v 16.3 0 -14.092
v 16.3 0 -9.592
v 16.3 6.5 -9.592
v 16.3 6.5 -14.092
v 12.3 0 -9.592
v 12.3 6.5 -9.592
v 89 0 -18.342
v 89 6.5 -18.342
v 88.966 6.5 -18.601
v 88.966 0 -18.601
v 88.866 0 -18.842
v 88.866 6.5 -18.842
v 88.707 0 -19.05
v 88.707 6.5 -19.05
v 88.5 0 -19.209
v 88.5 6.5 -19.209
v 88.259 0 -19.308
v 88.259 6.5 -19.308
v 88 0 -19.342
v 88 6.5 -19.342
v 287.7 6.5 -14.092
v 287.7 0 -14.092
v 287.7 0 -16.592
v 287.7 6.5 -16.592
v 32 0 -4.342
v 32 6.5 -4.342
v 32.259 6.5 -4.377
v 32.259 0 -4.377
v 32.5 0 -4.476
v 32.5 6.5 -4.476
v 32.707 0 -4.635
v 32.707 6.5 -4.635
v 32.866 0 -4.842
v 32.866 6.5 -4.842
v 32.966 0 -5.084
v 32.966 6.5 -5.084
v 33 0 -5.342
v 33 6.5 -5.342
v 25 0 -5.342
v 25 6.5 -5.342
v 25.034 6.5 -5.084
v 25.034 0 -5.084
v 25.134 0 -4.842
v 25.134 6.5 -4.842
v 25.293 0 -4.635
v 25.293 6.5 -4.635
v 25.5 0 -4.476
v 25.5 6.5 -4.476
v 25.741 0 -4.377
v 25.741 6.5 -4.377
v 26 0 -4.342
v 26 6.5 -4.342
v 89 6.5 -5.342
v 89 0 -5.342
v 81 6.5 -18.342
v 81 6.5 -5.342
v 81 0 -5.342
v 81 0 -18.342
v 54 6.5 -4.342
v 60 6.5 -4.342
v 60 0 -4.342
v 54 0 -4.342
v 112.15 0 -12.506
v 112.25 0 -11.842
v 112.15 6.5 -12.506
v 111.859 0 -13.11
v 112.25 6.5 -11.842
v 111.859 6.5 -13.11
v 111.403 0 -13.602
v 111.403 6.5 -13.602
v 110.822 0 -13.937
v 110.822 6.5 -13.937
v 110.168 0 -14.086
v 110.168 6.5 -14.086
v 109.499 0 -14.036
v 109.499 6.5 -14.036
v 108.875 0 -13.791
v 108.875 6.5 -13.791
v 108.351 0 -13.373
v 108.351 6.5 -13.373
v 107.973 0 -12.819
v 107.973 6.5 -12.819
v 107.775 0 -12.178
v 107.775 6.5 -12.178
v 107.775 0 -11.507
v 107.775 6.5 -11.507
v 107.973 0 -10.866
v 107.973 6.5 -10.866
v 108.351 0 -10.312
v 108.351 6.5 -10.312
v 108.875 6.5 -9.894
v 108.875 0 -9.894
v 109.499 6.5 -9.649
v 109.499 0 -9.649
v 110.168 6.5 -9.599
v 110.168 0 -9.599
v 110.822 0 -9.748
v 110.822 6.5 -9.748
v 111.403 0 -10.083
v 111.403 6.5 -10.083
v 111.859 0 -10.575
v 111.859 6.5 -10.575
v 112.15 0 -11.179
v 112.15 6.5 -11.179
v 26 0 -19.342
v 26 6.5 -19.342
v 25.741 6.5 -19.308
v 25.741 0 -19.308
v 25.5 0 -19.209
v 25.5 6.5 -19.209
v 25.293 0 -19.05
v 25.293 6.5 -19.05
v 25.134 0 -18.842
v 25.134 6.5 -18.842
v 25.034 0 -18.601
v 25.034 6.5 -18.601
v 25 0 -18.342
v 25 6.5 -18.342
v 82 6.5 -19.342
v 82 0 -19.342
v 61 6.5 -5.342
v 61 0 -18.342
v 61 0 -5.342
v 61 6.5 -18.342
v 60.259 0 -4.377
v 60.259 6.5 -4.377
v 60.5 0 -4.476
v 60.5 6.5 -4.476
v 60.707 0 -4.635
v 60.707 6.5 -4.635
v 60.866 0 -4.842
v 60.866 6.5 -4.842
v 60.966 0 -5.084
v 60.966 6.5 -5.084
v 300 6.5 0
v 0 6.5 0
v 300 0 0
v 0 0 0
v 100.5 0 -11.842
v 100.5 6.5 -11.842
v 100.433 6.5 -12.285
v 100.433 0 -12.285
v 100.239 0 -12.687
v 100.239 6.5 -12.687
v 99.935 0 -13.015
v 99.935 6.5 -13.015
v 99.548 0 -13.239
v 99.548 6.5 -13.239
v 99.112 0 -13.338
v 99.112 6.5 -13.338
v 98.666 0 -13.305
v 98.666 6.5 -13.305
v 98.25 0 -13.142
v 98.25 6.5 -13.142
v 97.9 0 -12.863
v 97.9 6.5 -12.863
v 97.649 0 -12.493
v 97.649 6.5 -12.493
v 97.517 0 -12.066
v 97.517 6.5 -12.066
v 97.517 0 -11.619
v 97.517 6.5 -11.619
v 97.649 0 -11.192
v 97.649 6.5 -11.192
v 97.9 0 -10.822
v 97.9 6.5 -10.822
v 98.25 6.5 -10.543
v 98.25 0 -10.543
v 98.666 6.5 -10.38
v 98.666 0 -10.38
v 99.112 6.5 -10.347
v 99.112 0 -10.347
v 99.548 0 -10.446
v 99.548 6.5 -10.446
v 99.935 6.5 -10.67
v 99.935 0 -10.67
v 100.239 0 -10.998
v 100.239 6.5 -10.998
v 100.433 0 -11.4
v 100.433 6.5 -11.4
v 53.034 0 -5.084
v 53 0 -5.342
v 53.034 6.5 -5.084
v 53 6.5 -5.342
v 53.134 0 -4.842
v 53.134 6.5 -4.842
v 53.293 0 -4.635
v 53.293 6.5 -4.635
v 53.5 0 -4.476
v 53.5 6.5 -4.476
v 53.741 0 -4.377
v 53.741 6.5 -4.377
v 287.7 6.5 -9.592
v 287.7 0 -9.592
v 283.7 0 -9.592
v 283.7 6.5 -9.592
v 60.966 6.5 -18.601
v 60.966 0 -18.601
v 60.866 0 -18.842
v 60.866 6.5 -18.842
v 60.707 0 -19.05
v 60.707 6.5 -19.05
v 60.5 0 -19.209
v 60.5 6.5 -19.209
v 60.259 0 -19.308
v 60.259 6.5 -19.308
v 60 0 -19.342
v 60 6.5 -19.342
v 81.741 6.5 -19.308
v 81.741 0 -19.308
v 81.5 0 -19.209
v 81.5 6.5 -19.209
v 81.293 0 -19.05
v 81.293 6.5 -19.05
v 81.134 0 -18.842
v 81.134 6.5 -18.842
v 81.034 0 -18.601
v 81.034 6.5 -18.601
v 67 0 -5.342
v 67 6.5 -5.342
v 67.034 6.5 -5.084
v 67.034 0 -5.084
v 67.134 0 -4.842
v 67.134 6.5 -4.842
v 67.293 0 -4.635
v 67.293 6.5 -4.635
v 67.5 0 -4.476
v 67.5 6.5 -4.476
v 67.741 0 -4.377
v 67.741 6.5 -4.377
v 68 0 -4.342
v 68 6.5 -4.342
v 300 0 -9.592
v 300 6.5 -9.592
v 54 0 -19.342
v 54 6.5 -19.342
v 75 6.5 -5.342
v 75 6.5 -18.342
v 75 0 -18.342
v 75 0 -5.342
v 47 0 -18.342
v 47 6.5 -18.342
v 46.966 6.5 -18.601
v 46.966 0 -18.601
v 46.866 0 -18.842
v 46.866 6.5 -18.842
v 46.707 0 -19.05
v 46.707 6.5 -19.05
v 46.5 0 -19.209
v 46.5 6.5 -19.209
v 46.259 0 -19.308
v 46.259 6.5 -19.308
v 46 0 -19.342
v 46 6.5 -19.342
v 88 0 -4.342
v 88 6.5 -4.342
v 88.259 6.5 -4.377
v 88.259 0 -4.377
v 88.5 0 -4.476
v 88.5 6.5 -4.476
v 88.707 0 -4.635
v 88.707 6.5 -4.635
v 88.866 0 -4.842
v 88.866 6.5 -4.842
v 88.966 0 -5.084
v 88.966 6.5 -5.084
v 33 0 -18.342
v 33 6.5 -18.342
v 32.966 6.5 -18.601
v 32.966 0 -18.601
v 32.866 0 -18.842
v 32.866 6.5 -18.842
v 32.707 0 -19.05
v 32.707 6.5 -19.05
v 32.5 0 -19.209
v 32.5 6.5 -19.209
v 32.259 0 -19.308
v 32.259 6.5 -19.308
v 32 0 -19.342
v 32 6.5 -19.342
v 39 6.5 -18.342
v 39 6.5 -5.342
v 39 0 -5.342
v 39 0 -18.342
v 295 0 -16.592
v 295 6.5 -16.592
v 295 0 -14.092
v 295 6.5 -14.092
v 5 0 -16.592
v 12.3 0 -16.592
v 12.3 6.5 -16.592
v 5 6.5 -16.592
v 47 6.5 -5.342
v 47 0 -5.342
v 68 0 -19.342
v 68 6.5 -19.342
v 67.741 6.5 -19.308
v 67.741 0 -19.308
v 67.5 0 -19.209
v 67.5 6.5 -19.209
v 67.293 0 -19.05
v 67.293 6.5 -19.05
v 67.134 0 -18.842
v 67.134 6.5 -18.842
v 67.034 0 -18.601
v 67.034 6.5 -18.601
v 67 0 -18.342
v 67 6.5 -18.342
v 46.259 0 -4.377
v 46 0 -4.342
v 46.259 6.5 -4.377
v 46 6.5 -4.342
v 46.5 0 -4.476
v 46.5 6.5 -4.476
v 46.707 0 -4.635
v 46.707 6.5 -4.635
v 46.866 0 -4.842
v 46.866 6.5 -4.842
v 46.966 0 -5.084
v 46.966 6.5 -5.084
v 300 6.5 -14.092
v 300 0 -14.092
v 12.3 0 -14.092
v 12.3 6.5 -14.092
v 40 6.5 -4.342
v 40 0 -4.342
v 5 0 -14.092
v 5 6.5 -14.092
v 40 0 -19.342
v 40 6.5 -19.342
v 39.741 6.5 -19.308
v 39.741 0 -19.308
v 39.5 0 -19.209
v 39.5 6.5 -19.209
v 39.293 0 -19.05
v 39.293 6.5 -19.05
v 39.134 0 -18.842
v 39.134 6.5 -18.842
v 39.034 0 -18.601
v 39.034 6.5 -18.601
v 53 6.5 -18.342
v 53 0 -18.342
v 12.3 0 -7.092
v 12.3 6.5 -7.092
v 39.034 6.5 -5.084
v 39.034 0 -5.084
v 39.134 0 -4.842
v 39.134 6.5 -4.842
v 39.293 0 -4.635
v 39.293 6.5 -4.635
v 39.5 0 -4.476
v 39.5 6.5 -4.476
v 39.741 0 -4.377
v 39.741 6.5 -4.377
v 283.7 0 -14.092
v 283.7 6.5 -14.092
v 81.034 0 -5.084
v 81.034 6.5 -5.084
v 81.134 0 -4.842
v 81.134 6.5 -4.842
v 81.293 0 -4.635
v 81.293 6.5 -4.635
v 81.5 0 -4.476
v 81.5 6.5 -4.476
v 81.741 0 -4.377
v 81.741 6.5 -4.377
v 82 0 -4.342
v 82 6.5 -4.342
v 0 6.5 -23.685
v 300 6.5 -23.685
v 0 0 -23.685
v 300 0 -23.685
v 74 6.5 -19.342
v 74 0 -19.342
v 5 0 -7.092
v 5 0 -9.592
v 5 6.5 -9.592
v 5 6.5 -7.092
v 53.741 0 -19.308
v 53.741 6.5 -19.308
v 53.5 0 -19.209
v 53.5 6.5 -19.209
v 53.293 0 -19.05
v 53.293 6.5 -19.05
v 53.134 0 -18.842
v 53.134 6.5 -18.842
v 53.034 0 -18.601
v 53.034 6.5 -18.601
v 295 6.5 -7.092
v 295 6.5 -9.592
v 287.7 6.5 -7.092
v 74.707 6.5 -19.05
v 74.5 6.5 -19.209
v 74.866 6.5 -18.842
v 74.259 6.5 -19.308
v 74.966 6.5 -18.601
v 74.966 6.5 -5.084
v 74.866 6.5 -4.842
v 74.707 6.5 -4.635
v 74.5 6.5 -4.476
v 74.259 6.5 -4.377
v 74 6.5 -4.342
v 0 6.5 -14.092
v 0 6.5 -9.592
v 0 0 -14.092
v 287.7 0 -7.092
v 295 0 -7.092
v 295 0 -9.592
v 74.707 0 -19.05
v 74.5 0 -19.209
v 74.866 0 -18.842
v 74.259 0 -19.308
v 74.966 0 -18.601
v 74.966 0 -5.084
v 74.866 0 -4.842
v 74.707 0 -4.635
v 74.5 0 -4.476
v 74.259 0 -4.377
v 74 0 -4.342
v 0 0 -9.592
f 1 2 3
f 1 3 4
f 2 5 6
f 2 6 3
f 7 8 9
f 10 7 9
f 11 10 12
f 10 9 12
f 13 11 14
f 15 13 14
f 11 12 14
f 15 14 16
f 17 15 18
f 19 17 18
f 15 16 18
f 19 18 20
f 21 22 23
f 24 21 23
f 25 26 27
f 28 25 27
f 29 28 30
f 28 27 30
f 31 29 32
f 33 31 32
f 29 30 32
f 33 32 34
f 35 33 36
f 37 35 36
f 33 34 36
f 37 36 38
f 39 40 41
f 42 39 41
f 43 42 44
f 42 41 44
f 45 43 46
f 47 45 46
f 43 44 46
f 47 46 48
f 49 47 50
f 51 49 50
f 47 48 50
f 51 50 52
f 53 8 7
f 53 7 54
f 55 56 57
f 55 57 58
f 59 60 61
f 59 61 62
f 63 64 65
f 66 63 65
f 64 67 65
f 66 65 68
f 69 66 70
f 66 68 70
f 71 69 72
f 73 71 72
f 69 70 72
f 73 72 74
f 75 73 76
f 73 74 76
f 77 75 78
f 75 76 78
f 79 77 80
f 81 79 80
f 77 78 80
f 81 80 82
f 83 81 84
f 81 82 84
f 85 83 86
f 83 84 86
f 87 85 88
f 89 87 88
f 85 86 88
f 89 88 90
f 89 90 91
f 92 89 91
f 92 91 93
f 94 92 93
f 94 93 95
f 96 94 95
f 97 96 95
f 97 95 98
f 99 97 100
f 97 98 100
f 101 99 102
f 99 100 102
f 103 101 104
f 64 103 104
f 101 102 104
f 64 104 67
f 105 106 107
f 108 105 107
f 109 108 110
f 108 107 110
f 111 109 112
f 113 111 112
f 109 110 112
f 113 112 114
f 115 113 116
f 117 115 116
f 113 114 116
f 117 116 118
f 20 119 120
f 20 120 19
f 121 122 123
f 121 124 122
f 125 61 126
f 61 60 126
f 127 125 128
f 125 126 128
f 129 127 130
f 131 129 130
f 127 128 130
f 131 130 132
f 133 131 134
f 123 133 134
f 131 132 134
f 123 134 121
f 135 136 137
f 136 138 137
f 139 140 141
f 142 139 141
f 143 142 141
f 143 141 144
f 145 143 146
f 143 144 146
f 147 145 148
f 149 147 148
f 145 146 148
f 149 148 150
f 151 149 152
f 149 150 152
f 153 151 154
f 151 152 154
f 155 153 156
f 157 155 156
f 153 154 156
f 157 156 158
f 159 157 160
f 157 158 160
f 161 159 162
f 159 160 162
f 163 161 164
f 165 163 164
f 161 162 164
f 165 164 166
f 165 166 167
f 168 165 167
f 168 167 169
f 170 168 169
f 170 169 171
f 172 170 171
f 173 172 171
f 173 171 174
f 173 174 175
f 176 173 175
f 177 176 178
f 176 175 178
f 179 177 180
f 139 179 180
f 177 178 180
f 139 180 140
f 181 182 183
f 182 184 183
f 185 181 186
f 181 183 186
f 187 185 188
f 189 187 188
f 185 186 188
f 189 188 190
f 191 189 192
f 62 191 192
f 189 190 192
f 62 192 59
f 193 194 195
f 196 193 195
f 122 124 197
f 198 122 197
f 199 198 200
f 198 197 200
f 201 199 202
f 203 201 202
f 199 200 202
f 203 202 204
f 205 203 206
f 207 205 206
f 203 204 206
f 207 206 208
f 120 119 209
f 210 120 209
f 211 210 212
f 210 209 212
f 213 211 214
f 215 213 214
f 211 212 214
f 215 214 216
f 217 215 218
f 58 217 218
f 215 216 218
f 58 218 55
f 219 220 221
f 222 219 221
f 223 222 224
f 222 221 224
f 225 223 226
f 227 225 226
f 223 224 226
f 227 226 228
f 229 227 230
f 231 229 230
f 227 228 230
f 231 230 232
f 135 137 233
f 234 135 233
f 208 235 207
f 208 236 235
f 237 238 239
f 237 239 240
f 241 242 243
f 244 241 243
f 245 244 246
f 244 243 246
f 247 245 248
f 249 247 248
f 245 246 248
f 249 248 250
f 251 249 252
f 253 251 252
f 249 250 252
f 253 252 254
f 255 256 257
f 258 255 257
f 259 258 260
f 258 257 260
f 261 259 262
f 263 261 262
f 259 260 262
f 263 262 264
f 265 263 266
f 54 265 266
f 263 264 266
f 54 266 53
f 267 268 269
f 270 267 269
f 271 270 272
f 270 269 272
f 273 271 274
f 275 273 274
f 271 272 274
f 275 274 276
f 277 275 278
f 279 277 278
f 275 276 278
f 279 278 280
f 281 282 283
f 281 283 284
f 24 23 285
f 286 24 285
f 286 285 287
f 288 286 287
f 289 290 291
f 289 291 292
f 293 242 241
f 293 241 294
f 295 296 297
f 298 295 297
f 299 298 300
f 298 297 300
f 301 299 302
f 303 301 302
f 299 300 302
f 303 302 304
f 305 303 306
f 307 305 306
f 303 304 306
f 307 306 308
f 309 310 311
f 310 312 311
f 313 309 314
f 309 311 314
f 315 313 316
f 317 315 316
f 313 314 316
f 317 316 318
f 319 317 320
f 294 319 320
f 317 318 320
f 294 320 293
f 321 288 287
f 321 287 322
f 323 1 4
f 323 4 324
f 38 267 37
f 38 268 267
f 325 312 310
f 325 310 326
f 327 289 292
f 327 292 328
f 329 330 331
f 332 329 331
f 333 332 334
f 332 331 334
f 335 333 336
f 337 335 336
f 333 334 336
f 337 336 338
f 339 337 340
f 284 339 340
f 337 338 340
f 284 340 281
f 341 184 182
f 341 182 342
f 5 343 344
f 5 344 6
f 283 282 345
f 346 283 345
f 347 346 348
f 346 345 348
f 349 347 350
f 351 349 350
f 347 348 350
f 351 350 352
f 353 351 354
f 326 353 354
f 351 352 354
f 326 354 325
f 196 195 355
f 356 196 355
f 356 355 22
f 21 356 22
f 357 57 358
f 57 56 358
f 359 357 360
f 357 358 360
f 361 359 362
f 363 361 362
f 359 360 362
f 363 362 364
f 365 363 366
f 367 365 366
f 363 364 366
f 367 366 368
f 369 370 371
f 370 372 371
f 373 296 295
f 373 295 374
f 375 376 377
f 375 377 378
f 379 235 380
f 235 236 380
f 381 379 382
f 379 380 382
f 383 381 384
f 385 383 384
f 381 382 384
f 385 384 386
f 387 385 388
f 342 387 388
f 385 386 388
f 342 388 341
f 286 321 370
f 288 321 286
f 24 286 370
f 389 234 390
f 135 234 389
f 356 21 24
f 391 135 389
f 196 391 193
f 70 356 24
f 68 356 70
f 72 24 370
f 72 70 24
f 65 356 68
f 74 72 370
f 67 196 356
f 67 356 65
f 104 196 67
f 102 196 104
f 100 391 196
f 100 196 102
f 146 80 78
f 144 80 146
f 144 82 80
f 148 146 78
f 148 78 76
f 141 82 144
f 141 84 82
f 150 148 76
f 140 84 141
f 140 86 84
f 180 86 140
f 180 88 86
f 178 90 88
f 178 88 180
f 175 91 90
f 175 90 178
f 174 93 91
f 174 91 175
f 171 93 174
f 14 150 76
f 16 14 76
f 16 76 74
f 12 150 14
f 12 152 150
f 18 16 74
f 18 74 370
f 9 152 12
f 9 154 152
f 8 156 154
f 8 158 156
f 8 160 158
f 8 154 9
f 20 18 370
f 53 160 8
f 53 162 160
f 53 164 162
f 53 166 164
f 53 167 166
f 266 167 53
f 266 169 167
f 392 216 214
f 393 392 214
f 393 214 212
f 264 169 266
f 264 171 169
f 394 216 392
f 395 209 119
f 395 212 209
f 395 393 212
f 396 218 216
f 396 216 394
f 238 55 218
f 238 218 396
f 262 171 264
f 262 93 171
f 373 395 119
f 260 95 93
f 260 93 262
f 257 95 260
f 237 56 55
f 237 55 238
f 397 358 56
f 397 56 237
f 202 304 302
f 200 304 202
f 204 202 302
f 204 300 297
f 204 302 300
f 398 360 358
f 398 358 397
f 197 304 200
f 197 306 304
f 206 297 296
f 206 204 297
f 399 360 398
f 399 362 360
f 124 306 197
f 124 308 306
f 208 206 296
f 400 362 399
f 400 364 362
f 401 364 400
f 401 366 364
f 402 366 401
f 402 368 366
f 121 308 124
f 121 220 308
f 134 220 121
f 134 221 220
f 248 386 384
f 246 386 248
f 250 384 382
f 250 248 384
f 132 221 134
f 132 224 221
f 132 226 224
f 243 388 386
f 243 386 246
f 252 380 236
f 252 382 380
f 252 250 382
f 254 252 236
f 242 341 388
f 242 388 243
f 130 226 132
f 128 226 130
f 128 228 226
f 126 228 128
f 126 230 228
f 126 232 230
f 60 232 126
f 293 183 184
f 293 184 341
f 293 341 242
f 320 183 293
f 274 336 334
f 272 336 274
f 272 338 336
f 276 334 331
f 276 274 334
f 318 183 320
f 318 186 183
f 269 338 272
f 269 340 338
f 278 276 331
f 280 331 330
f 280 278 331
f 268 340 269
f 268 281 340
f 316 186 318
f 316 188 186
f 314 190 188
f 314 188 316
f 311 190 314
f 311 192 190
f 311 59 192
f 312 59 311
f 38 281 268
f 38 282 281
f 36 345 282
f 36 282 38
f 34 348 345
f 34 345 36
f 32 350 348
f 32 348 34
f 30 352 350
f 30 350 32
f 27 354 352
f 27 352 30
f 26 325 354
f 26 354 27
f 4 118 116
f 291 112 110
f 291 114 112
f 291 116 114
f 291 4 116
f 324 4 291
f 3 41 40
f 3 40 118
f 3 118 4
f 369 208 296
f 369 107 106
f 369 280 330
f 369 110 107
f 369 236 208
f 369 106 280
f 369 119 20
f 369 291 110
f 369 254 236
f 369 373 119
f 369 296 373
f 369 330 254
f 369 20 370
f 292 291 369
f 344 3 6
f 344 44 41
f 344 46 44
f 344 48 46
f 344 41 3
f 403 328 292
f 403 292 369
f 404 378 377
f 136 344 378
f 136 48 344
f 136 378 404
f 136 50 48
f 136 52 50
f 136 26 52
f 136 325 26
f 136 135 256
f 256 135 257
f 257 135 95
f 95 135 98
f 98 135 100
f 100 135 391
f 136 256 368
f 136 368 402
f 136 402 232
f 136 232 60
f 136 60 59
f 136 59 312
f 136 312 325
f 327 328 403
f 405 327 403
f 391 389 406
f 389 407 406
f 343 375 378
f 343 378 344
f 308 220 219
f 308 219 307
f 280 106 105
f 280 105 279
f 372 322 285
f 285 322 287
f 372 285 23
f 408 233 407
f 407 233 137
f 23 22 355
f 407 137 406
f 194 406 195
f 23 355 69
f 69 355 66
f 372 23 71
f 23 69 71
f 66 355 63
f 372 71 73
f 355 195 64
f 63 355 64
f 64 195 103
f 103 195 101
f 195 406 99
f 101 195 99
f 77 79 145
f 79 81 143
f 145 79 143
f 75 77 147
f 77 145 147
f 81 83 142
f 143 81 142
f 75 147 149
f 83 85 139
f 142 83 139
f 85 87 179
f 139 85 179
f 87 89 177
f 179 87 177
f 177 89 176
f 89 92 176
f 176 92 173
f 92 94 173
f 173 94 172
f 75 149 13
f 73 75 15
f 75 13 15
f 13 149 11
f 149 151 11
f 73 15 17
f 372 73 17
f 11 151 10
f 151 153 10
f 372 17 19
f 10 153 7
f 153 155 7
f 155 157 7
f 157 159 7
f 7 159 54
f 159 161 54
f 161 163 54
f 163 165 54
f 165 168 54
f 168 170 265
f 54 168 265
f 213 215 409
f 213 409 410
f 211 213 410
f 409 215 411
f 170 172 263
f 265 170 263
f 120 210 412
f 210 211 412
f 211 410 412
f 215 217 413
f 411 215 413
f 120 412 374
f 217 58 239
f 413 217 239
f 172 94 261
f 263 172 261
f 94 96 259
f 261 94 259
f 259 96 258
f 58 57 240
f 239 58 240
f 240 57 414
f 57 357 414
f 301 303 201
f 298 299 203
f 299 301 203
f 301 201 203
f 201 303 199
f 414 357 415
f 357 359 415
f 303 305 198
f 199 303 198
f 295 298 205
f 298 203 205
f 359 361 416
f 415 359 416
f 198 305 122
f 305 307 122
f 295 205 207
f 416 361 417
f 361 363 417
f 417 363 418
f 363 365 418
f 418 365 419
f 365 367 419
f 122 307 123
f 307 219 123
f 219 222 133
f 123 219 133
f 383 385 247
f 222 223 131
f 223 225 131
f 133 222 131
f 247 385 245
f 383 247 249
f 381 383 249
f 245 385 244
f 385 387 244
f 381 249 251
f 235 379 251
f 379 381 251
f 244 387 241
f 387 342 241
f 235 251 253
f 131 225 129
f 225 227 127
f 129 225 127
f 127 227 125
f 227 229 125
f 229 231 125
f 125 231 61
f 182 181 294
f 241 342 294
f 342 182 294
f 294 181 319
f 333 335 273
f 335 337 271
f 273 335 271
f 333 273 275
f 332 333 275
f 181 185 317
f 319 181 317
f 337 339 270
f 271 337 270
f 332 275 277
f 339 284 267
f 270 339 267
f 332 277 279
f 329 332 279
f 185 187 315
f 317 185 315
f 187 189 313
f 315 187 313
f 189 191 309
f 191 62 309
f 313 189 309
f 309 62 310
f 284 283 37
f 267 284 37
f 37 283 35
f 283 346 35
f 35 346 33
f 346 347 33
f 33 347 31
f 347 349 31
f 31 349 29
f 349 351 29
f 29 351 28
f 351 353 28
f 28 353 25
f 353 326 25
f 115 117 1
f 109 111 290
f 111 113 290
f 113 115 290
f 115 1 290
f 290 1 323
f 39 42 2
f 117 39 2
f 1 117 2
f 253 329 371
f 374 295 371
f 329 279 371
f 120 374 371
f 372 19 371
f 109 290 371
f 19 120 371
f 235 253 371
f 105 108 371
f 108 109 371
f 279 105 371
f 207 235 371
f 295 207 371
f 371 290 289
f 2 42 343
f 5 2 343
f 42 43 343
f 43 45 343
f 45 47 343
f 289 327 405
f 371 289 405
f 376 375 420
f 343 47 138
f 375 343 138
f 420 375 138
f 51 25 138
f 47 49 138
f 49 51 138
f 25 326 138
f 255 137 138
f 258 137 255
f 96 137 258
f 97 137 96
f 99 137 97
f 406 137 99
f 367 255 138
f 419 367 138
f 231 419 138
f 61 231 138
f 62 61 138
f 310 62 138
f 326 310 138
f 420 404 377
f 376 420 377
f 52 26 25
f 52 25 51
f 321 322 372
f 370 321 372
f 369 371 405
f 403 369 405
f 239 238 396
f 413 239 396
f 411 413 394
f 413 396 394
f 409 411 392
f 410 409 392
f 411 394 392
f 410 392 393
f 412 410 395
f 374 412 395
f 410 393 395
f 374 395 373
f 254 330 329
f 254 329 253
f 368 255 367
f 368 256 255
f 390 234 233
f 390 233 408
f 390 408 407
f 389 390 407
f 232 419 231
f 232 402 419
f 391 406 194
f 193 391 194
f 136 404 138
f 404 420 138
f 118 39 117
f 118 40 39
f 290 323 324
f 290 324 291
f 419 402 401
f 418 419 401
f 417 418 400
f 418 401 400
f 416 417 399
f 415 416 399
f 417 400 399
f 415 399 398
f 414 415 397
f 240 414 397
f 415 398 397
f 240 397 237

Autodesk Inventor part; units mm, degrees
ref_plane "YZ Plane" through (0, 0, 0) normal (1, 0, 0) x (0, 1, 0)
ref_plane "XZ Plane" through (0, 0, 0) normal (0, 1, 0) x (-1, 0, 0)
ref_plane "XY Plane" through (0, 0, 0) normal (0, 0, 1) x (1, 0, 0)
sketch "Sketch1" plane through (0, 0, 0) normal (0, 1, 0) x (-1, 0, 0)
  line L0 (0, 0) -> (-300, 0)
  line L1 (-300, 0) -> (-300, -23.685)
  line L2 (-300, -23.685) -> (0, -23.685)
  line L3 (0, -23.685) -> (0, 0)
  dimension "d0" = 300
  dimension "d1" = 23.685
extrude "Extrusion1" add sketch "Sketch1" along normal blind 6.5
sketch "Sketch2" plane through (0, 6.5, 0) normal (0, 1, 0) x (1, 0, 0)
  line L0 (0, 23.685) -> (0, 0) projected
  line L1 (26, 19.3425) -> (32, 19.3425)
  line L2 (33, 18.3425) -> (33, 5.3425)
  line L3 (32, 4.3425) -> (26, 4.3425)
  line L4 (25, 5.3425) -> (25, 18.3425)
  arc A0 (26, 19.3425) -> (25, 18.3425) centre (26, 18.3425) ccw
  arc A1 (25, 5.3425) -> (26, 4.3425) centre (26, 5.3425) ccw
  arc A2 (32, 4.3425) -> (33, 5.3425) centre (32, 5.3425) ccw
  arc A3 (33, 18.3425) -> (32, 19.3425) centre (32, 18.3425) ccw
  point P0 (25, 11.8425)
  point P1 (0, 11.8425)
  dimension "d4" = 1
  dimension "d5" = 15
  dimension "d6" = 8
  dimension "d7" = 25
extrude "Extrusion2" cut sketch "Sketch2" against normal through all
pattern_linear "Rectangular Pattern1" count 5 spacing 14 along (1, 0, 0) of "Extrusion2"
sketch "Sketch3" plane through (0, 0, 0) normal (0, -1, 0) x (1, 0, 0)
  line L0 (0, 0) -> (300, 0) projected
  line L1 (0, -23.685) -> (0, 0) projected
  line L2 (300, -23.685) -> (0, -23.685) projected
  line L3 (16.3, -9.5925) -> (16.3, -14.0925)
  line L4 (0, -14.0925) -> (0, -9.5925)
  line L5 (5, -7.0925) -> (12.3, -7.0925)
  line L6 (12.3, -16.5925) -> (5, -16.5925)
  line L7 (150, 0) -> (150, -23.685) construction
  line L8 (0, -9.5925) -> (5, -9.5925)
  line L9 (12.3, -9.5925) -> (16.3, -9.5925)
  line L10 (16.3, -14.0925) -> (12.3, -14.0925)
  line L11 (5, -14.0925) -> (0, -14.0925)
  line L12 (5, -16.5925) -> (5, -14.0925)
  line L13 (5, -9.5925) -> (5, -7.0925)
  line L14 (12.3, -7.0925) -> (12.3, -9.5925)
  line L15 (12.3, -14.0925) -> (12.3, -16.5925)
  line L16 (283.7, -9.5925) -> (283.7, -14.0925)
  line L17 (300, -14.0925) -> (300, -9.5925)
  line L18 (295, -7.0925) -> (287.7, -7.0925)
  line L19 (287.7, -16.5925) -> (295, -16.5925)
  line L20 (300, -9.5925) -> (295, -9.5925)
  line L21 (287.7, -9.5925) -> (283.7, -9.5925)
  line L22 (283.7, -14.0925) -> (287.7, -14.0925)
  line L23 (295, -14.0925) -> (300, -14.0925)
  line L24 (295, -16.5925) -> (295, -14.0925)
  line L25 (295, -9.5925) -> (295, -7.0925)
  line L26 (287.7, -7.0925) -> (287.7, -9.5925)
  line L27 (287.7, -14.0925) -> (287.7, -16.5925)
  point P0 (16.3, -11.8425)
  point P1 (0, -11.8425)
  point P2 (283.7, -11.8425)
  point P3 (300, -11.8425)
  dimension "d13" = 4.5
  dimension "d14" = 5
  dimension "d15" = 4
  dimension "d16" = 7.3
  dimension "d17" = 2.5
extrude "Extrusion3" cut sketch "Sketch3" against normal through all
sketch "Sketch4" plane through (0, 6.5, 0) normal (0, 1, 0) x (1, 0, 0)
  line L0 (16.3, 14.0925) -> (16.3, 9.5925) projected
  line L1 (0, 9.5925) -> (0, 0) projected
  line L2 (89, 18.3425) -> (89, 5.3425) projected
  circle A0 centre (110, 11.8425) radius 2.25
  circle A1 centre (99, 11.8425) radius 1.5
  point P0 (16.3, 11.8425)
  dimension "d20" = 110
  dimension "d21" = 4.5
  dimension "d22" = 3
  dimension "d23" = 10
extrude "Extrusion4" cut sketch "Sketch4" against normal through all
properties part number "front_pane_middle" material "Plywood, Finish"
